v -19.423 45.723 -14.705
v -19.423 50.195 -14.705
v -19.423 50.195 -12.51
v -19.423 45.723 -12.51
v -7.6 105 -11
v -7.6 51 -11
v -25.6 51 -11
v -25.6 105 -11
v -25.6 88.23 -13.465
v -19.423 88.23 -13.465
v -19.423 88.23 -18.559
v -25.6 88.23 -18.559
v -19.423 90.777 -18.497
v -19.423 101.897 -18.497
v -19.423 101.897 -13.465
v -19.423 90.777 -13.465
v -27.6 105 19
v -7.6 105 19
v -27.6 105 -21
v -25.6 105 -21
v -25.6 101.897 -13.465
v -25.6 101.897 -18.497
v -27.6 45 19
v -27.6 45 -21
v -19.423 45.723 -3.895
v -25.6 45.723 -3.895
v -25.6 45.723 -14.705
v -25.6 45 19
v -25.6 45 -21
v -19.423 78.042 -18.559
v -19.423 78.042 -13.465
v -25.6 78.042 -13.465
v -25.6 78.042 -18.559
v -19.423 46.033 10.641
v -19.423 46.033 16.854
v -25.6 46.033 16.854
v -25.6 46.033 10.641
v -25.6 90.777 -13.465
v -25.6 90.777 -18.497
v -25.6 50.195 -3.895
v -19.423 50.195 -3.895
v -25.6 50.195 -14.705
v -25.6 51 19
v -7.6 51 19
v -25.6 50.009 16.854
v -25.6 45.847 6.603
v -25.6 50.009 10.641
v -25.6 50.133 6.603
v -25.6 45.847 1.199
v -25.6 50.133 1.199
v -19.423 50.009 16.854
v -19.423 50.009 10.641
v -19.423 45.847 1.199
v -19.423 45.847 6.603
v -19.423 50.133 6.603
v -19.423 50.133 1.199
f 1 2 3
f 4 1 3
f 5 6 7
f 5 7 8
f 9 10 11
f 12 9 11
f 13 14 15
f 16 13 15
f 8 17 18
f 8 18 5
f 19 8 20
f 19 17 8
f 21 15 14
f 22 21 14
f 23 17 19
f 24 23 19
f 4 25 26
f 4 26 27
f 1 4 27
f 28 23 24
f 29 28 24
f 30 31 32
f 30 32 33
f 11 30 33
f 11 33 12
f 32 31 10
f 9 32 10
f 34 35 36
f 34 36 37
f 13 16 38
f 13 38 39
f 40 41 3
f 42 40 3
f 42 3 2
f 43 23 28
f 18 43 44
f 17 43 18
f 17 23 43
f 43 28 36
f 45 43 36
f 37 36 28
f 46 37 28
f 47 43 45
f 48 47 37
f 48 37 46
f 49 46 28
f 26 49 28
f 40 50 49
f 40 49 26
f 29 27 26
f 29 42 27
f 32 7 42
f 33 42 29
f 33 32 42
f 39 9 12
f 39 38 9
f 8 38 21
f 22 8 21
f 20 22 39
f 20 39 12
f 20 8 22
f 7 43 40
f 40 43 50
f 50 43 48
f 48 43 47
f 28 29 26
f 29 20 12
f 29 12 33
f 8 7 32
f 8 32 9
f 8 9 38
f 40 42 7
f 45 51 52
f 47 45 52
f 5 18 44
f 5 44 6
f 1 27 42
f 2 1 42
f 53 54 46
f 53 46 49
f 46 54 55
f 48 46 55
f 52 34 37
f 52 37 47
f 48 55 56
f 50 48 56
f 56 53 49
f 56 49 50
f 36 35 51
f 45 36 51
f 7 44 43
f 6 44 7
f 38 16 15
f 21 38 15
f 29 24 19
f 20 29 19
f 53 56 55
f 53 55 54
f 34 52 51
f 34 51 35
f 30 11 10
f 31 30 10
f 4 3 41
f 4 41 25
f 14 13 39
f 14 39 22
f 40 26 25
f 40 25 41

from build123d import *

# Parameters (mm, degrees)
SKETCH054_W             = 40
SKETCH054_H             = 60
PAD026_DEPTH            = 20
SKETCH055_W             = 76.736599
SKETCH055_H             = 75.902515
SKETCH055_W_2           = 30
SKETCH055_H_2           = 54
SKETCH055_W_3           = 6.212331
SKETCH055_H_3           = 3.975892
SKETCH055_W_4           = 5.404726
SKETCH055_H_4           = 4.286509
SKETCH055_W_5           = 10.809453
SKETCH055_H_5           = 4.472877
SKETCH055_W_6           = 5.031989
SKETCH055_H_6           = 11.120071
SKETCH055_W_7           = 5.094109
SKETCH055_H_7           = 10.188222
POCKET035_DEPTH         = 18
SKETCH056_W             = 9.119706
SKETCH056_H             = 14.092372
POCKET036_DEPTH         = 56.898491
POCKET036_FACE35_W      = 4.472877
POCKET036_FACE35_H      = 11.822582
POCKET037_DEPTH         = 31.511028
BODY012_PLACEMENT_ANGLE = 90


with BuildPart() as part:
    # Sketch054 → Pad026 (new body)
    with BuildSketch(Plane.XY):
        Rectangle(SKETCH054_W, SKETCH054_H)
    extrude(amount=PAD026_DEPTH)

    # Sketch055 (on Face6 of Pad026) → Pocket035 (cut)
    with BuildSketch(Plane.XY.offset(20)):
        with Locations((-3.081739, -0.215215)):
            Rectangle(SKETCH055_W, SKETCH055_H)
        with Locations((-5, 3)):
            Rectangle(SKETCH055_W_2, SKETCH055_H_2, mode=Mode.SUBTRACT)
        with Locations((-14.747609, -26.978939)):
            Rectangle(SKETCH055_W_3, SKETCH055_H_3, mode=Mode.SUBTRACT)
        with Locations((-4.901067, -27.009999)):
            Rectangle(SKETCH055_W_4, SKETCH055_H_4, mode=Mode.SUBTRACT)
        with Locations((8.300133, -27.041061)):
            Rectangle(SKETCH055_W_5, SKETCH055_H_5, mode=Mode.SUBTRACT)
        with Locations((14.981133, 21.337455)):
            Rectangle(SKETCH055_W_6, SKETCH055_H_6, mode=Mode.SUBTRACT)
        with Locations((15.012193, 8.136257)):
            Rectangle(SKETCH055_W_7, SKETCH055_H_7, mode=Mode.SUBTRACT)
    extrude(amount=-POCKET035_DEPTH, mode=Mode.SUBTRACT)

    # Sketch056 (on Face20 of Pocket035) → Pocket036 (cut, through all)
    with BuildSketch(Plane(origin=(0, 26.897491, 0), x_dir=(-1, 0, 0), z_dir=(0, 1, 0))):
        with Locations((-16.069881, 15.223603)):
            Rectangle(SKETCH056_W, SKETCH056_H)
    extrude(amount=-POCKET036_DEPTH, mode=Mode.SUBTRACT)

    # Pocket036 Face35 → Pocket037 (cut, through all)
    with BuildSketch(Plane(origin=(11.510028, -27.041061, 14.088709), x_dir=(0, -1, 0), z_dir=(1, 0, 0))):
        with Locations((1e-06, 0)):
            Rectangle(POCKET036_FACE35_W, POCKET036_FACE35_H)
    extrude(amount=-POCKET037_DEPTH, mode=Mode.SUBTRACT)


with BuildPart() as part_1:
    # Body012 placement: moved
    add(part.part.moved(Location((-27.6, 75, -1))).rotate(Axis((-27.6, 75, -1), (0, 1, 0)), BODY012_PLACEMENT_ANGLE))


solid = part_1.part
